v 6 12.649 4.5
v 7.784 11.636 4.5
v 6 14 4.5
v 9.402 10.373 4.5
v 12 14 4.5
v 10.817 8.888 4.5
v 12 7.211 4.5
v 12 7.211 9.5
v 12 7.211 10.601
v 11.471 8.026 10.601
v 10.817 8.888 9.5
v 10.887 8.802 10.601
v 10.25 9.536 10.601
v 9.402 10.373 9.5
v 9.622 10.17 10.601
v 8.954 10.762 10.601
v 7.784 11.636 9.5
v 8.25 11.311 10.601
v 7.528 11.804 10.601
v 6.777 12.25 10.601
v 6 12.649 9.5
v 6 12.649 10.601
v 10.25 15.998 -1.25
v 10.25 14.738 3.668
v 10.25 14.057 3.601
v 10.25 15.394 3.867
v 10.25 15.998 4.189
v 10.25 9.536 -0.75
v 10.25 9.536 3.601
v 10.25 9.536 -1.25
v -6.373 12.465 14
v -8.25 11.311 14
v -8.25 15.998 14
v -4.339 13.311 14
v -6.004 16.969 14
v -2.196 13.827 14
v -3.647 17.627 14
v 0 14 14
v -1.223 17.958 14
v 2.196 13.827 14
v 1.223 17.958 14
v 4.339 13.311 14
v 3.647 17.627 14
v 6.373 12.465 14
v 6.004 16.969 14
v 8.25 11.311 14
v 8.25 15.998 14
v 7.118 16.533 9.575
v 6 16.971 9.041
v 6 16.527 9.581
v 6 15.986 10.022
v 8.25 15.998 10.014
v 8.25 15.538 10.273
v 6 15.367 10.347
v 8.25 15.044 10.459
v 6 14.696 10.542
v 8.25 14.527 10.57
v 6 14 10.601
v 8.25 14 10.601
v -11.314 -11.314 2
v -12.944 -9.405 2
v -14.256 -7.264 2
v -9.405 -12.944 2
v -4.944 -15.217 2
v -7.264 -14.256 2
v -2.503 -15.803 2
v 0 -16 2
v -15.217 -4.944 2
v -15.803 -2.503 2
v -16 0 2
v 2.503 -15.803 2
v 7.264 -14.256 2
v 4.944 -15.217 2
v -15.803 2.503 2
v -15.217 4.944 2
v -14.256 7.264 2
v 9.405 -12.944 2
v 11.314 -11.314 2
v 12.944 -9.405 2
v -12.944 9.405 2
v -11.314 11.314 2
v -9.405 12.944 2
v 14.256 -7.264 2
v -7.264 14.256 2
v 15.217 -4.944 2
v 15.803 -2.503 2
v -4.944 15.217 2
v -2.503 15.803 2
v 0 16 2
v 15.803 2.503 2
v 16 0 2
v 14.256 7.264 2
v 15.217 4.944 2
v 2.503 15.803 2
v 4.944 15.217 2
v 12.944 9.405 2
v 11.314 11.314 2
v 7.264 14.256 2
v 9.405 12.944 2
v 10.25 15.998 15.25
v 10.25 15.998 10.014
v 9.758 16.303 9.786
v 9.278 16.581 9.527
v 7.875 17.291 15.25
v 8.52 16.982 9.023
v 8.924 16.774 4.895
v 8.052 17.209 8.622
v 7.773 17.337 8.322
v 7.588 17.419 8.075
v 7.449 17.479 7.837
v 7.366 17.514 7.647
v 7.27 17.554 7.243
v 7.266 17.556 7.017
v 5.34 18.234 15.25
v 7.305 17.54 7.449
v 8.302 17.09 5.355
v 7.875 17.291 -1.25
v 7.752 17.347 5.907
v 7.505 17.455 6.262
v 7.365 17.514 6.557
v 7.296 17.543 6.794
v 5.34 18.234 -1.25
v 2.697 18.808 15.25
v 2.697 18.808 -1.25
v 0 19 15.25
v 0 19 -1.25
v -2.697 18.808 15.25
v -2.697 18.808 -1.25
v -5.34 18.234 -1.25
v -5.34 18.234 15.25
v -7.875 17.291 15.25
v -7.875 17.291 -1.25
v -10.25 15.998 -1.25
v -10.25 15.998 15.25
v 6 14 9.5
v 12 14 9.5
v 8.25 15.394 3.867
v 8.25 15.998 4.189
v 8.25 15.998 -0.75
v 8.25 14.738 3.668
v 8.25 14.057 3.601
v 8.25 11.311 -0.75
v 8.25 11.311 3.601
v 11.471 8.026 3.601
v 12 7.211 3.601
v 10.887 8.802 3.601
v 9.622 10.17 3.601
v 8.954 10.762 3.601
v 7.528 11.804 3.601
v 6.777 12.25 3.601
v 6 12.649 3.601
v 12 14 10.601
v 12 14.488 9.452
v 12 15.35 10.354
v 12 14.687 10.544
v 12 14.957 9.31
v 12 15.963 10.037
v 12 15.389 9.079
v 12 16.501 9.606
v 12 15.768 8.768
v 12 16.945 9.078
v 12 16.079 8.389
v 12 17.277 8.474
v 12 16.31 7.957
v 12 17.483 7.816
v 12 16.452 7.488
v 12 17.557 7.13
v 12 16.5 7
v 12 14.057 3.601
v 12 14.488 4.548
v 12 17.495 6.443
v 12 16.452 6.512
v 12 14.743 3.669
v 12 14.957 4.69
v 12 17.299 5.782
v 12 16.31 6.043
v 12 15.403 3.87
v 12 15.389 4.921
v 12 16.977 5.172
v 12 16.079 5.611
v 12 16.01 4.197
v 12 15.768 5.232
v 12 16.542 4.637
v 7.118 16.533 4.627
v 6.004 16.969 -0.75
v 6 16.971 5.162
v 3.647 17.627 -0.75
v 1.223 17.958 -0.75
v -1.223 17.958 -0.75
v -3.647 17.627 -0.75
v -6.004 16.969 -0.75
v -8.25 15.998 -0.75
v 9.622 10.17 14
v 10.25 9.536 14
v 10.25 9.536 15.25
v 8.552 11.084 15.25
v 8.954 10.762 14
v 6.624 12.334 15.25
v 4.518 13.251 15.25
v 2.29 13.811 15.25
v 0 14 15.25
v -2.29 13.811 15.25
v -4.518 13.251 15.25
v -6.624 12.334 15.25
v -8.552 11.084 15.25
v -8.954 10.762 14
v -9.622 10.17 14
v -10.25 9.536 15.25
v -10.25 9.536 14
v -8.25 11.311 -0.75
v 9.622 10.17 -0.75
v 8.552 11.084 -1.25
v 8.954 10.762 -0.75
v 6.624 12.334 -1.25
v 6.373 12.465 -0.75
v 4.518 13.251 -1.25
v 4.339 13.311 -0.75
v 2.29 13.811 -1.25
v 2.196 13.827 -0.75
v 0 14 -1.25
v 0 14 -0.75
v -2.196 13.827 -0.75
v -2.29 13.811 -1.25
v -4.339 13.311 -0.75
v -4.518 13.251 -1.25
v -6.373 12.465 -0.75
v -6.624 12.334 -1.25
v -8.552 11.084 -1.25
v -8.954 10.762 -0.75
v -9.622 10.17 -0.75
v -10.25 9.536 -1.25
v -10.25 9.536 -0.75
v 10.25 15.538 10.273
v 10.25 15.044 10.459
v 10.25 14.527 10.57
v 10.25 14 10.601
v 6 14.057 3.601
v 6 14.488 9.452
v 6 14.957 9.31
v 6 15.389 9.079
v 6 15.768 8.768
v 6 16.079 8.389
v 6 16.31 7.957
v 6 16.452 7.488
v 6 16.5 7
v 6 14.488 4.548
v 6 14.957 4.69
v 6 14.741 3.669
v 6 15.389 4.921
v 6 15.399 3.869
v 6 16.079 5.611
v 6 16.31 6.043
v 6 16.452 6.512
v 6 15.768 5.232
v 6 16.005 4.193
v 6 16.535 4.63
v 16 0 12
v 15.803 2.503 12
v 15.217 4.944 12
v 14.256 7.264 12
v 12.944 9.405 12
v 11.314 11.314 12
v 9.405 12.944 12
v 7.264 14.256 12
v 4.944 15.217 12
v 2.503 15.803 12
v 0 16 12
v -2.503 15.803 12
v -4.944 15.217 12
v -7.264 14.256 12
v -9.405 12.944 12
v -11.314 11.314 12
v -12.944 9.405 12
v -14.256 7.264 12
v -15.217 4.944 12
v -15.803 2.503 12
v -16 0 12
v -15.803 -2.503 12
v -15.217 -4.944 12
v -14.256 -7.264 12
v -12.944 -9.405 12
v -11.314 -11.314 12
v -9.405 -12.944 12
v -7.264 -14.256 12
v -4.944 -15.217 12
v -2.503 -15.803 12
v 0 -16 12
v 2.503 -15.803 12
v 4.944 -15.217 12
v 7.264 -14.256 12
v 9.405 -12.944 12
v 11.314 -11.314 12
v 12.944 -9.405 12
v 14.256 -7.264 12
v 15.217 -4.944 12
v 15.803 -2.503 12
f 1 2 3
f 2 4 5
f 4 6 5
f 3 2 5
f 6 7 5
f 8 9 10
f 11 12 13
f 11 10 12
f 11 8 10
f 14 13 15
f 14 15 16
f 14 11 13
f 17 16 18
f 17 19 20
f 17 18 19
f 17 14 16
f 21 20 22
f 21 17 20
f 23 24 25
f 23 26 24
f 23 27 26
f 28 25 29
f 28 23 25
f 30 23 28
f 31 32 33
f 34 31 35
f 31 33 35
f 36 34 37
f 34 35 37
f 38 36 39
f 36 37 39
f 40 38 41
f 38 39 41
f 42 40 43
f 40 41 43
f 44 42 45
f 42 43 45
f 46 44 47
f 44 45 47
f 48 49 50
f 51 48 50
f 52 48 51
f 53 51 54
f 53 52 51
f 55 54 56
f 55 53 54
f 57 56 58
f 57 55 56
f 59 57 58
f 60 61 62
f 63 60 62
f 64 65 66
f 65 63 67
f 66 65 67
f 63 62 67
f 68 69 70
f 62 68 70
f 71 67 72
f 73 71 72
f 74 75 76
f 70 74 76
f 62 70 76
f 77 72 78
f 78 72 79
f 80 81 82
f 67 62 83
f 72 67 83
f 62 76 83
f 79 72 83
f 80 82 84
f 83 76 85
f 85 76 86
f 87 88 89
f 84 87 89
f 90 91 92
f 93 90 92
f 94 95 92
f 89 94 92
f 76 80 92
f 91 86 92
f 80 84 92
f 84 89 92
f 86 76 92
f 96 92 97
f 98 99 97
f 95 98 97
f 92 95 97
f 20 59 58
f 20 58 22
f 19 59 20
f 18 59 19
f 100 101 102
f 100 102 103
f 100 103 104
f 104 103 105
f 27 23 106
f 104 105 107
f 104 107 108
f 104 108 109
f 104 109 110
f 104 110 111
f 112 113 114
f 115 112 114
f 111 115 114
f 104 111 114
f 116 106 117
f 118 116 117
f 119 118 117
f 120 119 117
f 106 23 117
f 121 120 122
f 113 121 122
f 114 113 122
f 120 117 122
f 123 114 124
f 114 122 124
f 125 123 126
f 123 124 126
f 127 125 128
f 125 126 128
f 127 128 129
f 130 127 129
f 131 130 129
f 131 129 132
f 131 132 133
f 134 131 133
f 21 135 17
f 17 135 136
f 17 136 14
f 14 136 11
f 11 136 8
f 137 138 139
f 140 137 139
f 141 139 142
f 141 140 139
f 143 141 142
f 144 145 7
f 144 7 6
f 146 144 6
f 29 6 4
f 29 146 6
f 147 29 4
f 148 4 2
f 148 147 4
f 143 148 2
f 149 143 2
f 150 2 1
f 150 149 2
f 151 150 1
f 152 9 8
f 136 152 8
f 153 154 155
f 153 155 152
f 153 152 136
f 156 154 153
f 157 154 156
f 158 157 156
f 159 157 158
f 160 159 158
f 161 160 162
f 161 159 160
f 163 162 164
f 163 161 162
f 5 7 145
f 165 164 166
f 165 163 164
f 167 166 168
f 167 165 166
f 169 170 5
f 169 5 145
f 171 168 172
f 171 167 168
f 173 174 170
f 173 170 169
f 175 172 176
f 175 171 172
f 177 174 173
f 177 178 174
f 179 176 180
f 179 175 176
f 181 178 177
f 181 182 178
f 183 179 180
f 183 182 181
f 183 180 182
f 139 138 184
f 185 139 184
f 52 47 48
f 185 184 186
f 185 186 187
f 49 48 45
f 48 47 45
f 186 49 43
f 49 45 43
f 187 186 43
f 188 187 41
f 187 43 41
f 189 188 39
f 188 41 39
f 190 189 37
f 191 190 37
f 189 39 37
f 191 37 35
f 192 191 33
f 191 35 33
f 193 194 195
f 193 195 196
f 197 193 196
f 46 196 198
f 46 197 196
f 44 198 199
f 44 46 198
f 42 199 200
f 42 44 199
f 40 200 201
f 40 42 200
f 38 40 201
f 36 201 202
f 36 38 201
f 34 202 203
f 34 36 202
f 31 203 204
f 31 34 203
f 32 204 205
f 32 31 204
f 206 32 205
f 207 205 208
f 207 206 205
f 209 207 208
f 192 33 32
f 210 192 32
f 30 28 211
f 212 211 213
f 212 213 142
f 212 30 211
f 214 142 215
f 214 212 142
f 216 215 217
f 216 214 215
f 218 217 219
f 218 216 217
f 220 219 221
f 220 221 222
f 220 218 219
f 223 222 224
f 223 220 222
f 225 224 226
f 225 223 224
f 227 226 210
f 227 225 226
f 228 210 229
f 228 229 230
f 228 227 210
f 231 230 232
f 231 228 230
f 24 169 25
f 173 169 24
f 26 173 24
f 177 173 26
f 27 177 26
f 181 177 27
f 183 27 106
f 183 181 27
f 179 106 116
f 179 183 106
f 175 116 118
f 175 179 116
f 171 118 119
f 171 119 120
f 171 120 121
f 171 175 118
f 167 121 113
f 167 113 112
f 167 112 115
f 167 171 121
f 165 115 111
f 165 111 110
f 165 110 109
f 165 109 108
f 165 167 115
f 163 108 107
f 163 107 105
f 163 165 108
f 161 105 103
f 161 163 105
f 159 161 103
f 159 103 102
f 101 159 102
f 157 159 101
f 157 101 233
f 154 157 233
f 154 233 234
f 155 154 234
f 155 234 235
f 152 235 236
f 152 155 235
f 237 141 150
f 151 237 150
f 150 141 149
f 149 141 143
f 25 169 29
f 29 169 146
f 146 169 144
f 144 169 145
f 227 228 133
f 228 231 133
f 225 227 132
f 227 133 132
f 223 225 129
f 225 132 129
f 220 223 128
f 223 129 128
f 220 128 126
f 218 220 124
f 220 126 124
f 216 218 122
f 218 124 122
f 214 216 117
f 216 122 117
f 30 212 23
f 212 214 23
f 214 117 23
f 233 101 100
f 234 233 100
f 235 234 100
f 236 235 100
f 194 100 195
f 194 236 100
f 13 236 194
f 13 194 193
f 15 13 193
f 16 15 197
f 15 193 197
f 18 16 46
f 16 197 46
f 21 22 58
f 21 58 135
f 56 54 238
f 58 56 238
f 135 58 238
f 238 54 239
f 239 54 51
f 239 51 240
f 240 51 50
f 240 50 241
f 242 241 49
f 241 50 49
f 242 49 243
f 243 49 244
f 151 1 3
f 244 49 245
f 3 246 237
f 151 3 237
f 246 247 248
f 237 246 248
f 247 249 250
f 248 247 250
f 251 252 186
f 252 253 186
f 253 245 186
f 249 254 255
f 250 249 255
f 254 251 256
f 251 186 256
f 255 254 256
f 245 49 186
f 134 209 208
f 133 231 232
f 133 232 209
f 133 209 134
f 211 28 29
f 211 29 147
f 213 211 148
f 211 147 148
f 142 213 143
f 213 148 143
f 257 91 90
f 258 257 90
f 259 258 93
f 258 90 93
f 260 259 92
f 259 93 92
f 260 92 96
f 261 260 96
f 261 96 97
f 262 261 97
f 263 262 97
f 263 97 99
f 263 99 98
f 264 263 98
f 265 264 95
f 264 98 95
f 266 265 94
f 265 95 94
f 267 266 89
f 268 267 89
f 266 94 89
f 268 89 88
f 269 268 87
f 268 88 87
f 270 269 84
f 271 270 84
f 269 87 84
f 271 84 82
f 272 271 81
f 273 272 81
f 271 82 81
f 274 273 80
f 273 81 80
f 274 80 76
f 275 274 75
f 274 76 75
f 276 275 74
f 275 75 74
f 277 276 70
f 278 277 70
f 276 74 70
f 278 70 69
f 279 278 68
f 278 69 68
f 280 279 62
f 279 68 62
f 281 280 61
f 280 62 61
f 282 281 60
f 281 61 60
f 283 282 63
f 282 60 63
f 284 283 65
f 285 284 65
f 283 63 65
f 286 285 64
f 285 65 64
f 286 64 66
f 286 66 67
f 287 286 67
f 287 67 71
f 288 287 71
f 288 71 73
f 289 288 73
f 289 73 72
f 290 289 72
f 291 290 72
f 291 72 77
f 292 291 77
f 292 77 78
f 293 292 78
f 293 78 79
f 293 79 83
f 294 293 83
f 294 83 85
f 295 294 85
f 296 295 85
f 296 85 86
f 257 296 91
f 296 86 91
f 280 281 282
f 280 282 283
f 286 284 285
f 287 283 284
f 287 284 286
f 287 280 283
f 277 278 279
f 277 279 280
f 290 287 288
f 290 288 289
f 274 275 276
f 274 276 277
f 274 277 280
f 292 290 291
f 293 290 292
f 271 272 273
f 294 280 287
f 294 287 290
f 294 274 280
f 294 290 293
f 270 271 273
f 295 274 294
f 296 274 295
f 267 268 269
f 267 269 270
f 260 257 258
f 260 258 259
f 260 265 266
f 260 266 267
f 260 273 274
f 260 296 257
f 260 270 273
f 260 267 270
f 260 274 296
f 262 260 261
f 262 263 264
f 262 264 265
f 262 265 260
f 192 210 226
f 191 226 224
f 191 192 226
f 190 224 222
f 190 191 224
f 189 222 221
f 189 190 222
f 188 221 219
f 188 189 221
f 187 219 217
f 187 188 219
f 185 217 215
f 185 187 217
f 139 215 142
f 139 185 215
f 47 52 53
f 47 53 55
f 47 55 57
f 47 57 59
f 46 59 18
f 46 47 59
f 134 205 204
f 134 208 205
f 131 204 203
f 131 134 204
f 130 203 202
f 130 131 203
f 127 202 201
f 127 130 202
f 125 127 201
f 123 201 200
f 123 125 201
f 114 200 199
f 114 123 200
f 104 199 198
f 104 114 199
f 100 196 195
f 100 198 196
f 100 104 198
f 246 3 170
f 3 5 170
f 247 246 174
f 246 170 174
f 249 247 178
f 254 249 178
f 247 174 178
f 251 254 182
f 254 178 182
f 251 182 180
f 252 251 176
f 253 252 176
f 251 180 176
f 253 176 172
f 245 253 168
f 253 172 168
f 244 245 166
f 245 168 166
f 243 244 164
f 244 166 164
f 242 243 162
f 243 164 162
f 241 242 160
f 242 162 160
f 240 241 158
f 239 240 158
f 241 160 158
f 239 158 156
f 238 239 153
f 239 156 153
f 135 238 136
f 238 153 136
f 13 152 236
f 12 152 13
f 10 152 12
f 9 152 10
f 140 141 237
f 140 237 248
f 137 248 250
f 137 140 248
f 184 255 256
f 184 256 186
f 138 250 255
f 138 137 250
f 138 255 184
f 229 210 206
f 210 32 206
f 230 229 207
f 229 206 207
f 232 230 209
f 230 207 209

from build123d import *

# Parameters (mm, degrees)
CYLINDER002_R              = 14
CYLINDER002_DEPTH          = 10
EXTRUDE004_DEPTH           = 5
EXTRUDE004_DEPTH_BACK      = 1
EXTRUDE004_PLACEMENT_ANGLE = 270
EXTRUDE003_DEPTH           = 5
EXTRUDE003_DEPTH_BACK      = 1
EXTRUDE003_PLACEMENT_ANGLE = 270
EXTRUDE_DEPTH              = 14
EXTRUDE_DEPTH_BACK         = 0.75
EXTRUDE005_DEPTH           = 0.5
EXTRUDE002_DEPTH           = 1.25
CYLINDER003_R              = 16
CYLINDER003_DEPTH          = 10


with BuildPart() as cylinder002:
    # Cylinder002 → Cylinder002 (new body)
    with BuildSketch(Plane.XY.offset(2)):
        Circle(CYLINDER002_R)
    extrude(amount=CYLINDER002_DEPTH)


with BuildPart() as extrude004:
    # Sketch003 → Extrude004 (new body, two sides)
    with BuildSketch(Plane.YZ) as extrude004_sk:
        with BuildLine():
            ThreePointArc((2.5, 0), (7e-06, 2.5), (-2.5, 1.3e-05))
            Line((-2.5, 1.3e-05), (-2.5, -6.999987))
            Line((-2.5, -6.999987), (2.5, -6.999987))
            Line((2.5, -6.999987), (2.5, 0))
        make_face()
    extrude(amount=EXTRUDE004_DEPTH)
    extrude(extrude004_sk.sketch, amount=-EXTRUDE004_DEPTH_BACK)


with BuildPart() as extrude004_1:
    # Extrude004 placement: moved
    add(extrude004.part.moved(Location((7, 14, 7))).rotate(Axis((7, 14, 7), (1, 0, 0)), EXTRUDE004_PLACEMENT_ANGLE))


with BuildPart() as extrude003:
    # Sketch002 → Extrude003 (new body, two sides)
    with BuildSketch(Plane.YZ) as extrude003_sk:
        with BuildLine():
            ThreePointArc((3.398672, 0.056974), (-0.129816, 3.556876), (-3.600864, 0))
            Line((-3.600864, 0), (-3.600864, -8))
            Line((-3.600864, -8), (3.398672, -8))
            Line((3.398672, 0.056974), (3.398672, -8))
        make_face()
    extrude(amount=EXTRUDE003_DEPTH)
    extrude(extrude003_sk.sketch, amount=-EXTRUDE003_DEPTH_BACK)


with BuildPart() as extrude003_1:
    # Extrude003 placement: moved
    add(extrude003.part.moved(Location((7, 14, 7))).rotate(Axis((7, 14, 7), (1, 0, 0)), EXTRUDE003_PLACEMENT_ANGLE))


with BuildPart() as extrude_body:
    # Sketch001 → Extrude (new body, two sides)
    with BuildSketch(Plane.XY) as extrude_sk:
        with BuildLine():
            ThreePointArc((10.25, 15.998047), (0, 19), (-10.25, 15.998047))
            Line((-10.25, 9.536116), (-10.25, 15.998047))
            ThreePointArc((-8.25, 11.310946), (-9.29247, 10.471389), (-10.25, 9.536116))
            Line((-8.25, 15.998047), (-8.25, 11.310946))
            ThreePointArc((8.25, 15.998047), (0, 18), (-8.25, 15.998047))
            Line((8.25, 15.998047), (8.25, 11.310946))
            ThreePointArc((10.25, 9.536116), (9.29247, 10.471389), (8.25, 11.310946))
            Line((10.25, 15.998047), (10.25, 9.536116))
        make_face()
    extrude(amount=EXTRUDE_DEPTH)
    extrude(extrude_sk.sketch, amount=-EXTRUDE_DEPTH_BACK)


with BuildPart() as extrude005:
    # Sketch → Extrude005 (new body)
    with BuildSketch(Plane.XY):
        with BuildLine():
            ThreePointArc((10.25, 15.998047), (0, 19), (-10.25, 15.998047))
            Line((-10.25, 9.536116), (-10.25, 15.998047))
            ThreePointArc((10.25, 9.536116), (0, 14), (-10.25, 9.536116))
            Line((10.25, 15.998047), (10.25, 9.536116))
        make_face()
    extrude(amount=EXTRUDE005_DEPTH)


with BuildPart() as extrude005_1:
    # Extrude005 placement: moved
    add(extrude005.part.moved(Location((0, 0, -1.25))))


with BuildPart() as cut001:
    # Sketch → Extrude002 (new body)
    with BuildSketch(Plane.XY):
        with BuildLine():
            ThreePointArc((10.25, 15.998047), (0, 19), (-10.25, 15.998047))
            Line((-10.25, 9.536116), (-10.25, 15.998047))
            ThreePointArc((10.25, 9.536116), (0, 14), (-10.25, 9.536116))
            Line((10.25, 15.998047), (10.25, 9.536116))
        make_face()
    extrude(amount=EXTRUDE002_DEPTH)


with BuildPart() as cut001_1:
    # Extrude002 placement: moved
    add(cut001.part.moved(Location((0, 0, 14))))

    # Fusion: union Extrude body, Extrude005
    add(extrude_body.part)
    add(extrude005_1.part)

    # Fusion001: union Extrude003
    add(extrude003_1.part)

    # Cut: cut Extrude004
    add(extrude004_1.part, mode=Mode.SUBTRACT)

    # Cut001: cut Cylinder002
    add(cylinder002.part, mode=Mode.SUBTRACT)


with BuildPart() as cylinder003:
    # Cylinder003 → Cylinder003 (new body)
    with BuildSketch(Plane.XY.offset(2)):
        Circle(CYLINDER003_R)
    extrude(amount=CYLINDER003_DEPTH)


solid = Compound([cut001_1.part, cylinder003.part])
